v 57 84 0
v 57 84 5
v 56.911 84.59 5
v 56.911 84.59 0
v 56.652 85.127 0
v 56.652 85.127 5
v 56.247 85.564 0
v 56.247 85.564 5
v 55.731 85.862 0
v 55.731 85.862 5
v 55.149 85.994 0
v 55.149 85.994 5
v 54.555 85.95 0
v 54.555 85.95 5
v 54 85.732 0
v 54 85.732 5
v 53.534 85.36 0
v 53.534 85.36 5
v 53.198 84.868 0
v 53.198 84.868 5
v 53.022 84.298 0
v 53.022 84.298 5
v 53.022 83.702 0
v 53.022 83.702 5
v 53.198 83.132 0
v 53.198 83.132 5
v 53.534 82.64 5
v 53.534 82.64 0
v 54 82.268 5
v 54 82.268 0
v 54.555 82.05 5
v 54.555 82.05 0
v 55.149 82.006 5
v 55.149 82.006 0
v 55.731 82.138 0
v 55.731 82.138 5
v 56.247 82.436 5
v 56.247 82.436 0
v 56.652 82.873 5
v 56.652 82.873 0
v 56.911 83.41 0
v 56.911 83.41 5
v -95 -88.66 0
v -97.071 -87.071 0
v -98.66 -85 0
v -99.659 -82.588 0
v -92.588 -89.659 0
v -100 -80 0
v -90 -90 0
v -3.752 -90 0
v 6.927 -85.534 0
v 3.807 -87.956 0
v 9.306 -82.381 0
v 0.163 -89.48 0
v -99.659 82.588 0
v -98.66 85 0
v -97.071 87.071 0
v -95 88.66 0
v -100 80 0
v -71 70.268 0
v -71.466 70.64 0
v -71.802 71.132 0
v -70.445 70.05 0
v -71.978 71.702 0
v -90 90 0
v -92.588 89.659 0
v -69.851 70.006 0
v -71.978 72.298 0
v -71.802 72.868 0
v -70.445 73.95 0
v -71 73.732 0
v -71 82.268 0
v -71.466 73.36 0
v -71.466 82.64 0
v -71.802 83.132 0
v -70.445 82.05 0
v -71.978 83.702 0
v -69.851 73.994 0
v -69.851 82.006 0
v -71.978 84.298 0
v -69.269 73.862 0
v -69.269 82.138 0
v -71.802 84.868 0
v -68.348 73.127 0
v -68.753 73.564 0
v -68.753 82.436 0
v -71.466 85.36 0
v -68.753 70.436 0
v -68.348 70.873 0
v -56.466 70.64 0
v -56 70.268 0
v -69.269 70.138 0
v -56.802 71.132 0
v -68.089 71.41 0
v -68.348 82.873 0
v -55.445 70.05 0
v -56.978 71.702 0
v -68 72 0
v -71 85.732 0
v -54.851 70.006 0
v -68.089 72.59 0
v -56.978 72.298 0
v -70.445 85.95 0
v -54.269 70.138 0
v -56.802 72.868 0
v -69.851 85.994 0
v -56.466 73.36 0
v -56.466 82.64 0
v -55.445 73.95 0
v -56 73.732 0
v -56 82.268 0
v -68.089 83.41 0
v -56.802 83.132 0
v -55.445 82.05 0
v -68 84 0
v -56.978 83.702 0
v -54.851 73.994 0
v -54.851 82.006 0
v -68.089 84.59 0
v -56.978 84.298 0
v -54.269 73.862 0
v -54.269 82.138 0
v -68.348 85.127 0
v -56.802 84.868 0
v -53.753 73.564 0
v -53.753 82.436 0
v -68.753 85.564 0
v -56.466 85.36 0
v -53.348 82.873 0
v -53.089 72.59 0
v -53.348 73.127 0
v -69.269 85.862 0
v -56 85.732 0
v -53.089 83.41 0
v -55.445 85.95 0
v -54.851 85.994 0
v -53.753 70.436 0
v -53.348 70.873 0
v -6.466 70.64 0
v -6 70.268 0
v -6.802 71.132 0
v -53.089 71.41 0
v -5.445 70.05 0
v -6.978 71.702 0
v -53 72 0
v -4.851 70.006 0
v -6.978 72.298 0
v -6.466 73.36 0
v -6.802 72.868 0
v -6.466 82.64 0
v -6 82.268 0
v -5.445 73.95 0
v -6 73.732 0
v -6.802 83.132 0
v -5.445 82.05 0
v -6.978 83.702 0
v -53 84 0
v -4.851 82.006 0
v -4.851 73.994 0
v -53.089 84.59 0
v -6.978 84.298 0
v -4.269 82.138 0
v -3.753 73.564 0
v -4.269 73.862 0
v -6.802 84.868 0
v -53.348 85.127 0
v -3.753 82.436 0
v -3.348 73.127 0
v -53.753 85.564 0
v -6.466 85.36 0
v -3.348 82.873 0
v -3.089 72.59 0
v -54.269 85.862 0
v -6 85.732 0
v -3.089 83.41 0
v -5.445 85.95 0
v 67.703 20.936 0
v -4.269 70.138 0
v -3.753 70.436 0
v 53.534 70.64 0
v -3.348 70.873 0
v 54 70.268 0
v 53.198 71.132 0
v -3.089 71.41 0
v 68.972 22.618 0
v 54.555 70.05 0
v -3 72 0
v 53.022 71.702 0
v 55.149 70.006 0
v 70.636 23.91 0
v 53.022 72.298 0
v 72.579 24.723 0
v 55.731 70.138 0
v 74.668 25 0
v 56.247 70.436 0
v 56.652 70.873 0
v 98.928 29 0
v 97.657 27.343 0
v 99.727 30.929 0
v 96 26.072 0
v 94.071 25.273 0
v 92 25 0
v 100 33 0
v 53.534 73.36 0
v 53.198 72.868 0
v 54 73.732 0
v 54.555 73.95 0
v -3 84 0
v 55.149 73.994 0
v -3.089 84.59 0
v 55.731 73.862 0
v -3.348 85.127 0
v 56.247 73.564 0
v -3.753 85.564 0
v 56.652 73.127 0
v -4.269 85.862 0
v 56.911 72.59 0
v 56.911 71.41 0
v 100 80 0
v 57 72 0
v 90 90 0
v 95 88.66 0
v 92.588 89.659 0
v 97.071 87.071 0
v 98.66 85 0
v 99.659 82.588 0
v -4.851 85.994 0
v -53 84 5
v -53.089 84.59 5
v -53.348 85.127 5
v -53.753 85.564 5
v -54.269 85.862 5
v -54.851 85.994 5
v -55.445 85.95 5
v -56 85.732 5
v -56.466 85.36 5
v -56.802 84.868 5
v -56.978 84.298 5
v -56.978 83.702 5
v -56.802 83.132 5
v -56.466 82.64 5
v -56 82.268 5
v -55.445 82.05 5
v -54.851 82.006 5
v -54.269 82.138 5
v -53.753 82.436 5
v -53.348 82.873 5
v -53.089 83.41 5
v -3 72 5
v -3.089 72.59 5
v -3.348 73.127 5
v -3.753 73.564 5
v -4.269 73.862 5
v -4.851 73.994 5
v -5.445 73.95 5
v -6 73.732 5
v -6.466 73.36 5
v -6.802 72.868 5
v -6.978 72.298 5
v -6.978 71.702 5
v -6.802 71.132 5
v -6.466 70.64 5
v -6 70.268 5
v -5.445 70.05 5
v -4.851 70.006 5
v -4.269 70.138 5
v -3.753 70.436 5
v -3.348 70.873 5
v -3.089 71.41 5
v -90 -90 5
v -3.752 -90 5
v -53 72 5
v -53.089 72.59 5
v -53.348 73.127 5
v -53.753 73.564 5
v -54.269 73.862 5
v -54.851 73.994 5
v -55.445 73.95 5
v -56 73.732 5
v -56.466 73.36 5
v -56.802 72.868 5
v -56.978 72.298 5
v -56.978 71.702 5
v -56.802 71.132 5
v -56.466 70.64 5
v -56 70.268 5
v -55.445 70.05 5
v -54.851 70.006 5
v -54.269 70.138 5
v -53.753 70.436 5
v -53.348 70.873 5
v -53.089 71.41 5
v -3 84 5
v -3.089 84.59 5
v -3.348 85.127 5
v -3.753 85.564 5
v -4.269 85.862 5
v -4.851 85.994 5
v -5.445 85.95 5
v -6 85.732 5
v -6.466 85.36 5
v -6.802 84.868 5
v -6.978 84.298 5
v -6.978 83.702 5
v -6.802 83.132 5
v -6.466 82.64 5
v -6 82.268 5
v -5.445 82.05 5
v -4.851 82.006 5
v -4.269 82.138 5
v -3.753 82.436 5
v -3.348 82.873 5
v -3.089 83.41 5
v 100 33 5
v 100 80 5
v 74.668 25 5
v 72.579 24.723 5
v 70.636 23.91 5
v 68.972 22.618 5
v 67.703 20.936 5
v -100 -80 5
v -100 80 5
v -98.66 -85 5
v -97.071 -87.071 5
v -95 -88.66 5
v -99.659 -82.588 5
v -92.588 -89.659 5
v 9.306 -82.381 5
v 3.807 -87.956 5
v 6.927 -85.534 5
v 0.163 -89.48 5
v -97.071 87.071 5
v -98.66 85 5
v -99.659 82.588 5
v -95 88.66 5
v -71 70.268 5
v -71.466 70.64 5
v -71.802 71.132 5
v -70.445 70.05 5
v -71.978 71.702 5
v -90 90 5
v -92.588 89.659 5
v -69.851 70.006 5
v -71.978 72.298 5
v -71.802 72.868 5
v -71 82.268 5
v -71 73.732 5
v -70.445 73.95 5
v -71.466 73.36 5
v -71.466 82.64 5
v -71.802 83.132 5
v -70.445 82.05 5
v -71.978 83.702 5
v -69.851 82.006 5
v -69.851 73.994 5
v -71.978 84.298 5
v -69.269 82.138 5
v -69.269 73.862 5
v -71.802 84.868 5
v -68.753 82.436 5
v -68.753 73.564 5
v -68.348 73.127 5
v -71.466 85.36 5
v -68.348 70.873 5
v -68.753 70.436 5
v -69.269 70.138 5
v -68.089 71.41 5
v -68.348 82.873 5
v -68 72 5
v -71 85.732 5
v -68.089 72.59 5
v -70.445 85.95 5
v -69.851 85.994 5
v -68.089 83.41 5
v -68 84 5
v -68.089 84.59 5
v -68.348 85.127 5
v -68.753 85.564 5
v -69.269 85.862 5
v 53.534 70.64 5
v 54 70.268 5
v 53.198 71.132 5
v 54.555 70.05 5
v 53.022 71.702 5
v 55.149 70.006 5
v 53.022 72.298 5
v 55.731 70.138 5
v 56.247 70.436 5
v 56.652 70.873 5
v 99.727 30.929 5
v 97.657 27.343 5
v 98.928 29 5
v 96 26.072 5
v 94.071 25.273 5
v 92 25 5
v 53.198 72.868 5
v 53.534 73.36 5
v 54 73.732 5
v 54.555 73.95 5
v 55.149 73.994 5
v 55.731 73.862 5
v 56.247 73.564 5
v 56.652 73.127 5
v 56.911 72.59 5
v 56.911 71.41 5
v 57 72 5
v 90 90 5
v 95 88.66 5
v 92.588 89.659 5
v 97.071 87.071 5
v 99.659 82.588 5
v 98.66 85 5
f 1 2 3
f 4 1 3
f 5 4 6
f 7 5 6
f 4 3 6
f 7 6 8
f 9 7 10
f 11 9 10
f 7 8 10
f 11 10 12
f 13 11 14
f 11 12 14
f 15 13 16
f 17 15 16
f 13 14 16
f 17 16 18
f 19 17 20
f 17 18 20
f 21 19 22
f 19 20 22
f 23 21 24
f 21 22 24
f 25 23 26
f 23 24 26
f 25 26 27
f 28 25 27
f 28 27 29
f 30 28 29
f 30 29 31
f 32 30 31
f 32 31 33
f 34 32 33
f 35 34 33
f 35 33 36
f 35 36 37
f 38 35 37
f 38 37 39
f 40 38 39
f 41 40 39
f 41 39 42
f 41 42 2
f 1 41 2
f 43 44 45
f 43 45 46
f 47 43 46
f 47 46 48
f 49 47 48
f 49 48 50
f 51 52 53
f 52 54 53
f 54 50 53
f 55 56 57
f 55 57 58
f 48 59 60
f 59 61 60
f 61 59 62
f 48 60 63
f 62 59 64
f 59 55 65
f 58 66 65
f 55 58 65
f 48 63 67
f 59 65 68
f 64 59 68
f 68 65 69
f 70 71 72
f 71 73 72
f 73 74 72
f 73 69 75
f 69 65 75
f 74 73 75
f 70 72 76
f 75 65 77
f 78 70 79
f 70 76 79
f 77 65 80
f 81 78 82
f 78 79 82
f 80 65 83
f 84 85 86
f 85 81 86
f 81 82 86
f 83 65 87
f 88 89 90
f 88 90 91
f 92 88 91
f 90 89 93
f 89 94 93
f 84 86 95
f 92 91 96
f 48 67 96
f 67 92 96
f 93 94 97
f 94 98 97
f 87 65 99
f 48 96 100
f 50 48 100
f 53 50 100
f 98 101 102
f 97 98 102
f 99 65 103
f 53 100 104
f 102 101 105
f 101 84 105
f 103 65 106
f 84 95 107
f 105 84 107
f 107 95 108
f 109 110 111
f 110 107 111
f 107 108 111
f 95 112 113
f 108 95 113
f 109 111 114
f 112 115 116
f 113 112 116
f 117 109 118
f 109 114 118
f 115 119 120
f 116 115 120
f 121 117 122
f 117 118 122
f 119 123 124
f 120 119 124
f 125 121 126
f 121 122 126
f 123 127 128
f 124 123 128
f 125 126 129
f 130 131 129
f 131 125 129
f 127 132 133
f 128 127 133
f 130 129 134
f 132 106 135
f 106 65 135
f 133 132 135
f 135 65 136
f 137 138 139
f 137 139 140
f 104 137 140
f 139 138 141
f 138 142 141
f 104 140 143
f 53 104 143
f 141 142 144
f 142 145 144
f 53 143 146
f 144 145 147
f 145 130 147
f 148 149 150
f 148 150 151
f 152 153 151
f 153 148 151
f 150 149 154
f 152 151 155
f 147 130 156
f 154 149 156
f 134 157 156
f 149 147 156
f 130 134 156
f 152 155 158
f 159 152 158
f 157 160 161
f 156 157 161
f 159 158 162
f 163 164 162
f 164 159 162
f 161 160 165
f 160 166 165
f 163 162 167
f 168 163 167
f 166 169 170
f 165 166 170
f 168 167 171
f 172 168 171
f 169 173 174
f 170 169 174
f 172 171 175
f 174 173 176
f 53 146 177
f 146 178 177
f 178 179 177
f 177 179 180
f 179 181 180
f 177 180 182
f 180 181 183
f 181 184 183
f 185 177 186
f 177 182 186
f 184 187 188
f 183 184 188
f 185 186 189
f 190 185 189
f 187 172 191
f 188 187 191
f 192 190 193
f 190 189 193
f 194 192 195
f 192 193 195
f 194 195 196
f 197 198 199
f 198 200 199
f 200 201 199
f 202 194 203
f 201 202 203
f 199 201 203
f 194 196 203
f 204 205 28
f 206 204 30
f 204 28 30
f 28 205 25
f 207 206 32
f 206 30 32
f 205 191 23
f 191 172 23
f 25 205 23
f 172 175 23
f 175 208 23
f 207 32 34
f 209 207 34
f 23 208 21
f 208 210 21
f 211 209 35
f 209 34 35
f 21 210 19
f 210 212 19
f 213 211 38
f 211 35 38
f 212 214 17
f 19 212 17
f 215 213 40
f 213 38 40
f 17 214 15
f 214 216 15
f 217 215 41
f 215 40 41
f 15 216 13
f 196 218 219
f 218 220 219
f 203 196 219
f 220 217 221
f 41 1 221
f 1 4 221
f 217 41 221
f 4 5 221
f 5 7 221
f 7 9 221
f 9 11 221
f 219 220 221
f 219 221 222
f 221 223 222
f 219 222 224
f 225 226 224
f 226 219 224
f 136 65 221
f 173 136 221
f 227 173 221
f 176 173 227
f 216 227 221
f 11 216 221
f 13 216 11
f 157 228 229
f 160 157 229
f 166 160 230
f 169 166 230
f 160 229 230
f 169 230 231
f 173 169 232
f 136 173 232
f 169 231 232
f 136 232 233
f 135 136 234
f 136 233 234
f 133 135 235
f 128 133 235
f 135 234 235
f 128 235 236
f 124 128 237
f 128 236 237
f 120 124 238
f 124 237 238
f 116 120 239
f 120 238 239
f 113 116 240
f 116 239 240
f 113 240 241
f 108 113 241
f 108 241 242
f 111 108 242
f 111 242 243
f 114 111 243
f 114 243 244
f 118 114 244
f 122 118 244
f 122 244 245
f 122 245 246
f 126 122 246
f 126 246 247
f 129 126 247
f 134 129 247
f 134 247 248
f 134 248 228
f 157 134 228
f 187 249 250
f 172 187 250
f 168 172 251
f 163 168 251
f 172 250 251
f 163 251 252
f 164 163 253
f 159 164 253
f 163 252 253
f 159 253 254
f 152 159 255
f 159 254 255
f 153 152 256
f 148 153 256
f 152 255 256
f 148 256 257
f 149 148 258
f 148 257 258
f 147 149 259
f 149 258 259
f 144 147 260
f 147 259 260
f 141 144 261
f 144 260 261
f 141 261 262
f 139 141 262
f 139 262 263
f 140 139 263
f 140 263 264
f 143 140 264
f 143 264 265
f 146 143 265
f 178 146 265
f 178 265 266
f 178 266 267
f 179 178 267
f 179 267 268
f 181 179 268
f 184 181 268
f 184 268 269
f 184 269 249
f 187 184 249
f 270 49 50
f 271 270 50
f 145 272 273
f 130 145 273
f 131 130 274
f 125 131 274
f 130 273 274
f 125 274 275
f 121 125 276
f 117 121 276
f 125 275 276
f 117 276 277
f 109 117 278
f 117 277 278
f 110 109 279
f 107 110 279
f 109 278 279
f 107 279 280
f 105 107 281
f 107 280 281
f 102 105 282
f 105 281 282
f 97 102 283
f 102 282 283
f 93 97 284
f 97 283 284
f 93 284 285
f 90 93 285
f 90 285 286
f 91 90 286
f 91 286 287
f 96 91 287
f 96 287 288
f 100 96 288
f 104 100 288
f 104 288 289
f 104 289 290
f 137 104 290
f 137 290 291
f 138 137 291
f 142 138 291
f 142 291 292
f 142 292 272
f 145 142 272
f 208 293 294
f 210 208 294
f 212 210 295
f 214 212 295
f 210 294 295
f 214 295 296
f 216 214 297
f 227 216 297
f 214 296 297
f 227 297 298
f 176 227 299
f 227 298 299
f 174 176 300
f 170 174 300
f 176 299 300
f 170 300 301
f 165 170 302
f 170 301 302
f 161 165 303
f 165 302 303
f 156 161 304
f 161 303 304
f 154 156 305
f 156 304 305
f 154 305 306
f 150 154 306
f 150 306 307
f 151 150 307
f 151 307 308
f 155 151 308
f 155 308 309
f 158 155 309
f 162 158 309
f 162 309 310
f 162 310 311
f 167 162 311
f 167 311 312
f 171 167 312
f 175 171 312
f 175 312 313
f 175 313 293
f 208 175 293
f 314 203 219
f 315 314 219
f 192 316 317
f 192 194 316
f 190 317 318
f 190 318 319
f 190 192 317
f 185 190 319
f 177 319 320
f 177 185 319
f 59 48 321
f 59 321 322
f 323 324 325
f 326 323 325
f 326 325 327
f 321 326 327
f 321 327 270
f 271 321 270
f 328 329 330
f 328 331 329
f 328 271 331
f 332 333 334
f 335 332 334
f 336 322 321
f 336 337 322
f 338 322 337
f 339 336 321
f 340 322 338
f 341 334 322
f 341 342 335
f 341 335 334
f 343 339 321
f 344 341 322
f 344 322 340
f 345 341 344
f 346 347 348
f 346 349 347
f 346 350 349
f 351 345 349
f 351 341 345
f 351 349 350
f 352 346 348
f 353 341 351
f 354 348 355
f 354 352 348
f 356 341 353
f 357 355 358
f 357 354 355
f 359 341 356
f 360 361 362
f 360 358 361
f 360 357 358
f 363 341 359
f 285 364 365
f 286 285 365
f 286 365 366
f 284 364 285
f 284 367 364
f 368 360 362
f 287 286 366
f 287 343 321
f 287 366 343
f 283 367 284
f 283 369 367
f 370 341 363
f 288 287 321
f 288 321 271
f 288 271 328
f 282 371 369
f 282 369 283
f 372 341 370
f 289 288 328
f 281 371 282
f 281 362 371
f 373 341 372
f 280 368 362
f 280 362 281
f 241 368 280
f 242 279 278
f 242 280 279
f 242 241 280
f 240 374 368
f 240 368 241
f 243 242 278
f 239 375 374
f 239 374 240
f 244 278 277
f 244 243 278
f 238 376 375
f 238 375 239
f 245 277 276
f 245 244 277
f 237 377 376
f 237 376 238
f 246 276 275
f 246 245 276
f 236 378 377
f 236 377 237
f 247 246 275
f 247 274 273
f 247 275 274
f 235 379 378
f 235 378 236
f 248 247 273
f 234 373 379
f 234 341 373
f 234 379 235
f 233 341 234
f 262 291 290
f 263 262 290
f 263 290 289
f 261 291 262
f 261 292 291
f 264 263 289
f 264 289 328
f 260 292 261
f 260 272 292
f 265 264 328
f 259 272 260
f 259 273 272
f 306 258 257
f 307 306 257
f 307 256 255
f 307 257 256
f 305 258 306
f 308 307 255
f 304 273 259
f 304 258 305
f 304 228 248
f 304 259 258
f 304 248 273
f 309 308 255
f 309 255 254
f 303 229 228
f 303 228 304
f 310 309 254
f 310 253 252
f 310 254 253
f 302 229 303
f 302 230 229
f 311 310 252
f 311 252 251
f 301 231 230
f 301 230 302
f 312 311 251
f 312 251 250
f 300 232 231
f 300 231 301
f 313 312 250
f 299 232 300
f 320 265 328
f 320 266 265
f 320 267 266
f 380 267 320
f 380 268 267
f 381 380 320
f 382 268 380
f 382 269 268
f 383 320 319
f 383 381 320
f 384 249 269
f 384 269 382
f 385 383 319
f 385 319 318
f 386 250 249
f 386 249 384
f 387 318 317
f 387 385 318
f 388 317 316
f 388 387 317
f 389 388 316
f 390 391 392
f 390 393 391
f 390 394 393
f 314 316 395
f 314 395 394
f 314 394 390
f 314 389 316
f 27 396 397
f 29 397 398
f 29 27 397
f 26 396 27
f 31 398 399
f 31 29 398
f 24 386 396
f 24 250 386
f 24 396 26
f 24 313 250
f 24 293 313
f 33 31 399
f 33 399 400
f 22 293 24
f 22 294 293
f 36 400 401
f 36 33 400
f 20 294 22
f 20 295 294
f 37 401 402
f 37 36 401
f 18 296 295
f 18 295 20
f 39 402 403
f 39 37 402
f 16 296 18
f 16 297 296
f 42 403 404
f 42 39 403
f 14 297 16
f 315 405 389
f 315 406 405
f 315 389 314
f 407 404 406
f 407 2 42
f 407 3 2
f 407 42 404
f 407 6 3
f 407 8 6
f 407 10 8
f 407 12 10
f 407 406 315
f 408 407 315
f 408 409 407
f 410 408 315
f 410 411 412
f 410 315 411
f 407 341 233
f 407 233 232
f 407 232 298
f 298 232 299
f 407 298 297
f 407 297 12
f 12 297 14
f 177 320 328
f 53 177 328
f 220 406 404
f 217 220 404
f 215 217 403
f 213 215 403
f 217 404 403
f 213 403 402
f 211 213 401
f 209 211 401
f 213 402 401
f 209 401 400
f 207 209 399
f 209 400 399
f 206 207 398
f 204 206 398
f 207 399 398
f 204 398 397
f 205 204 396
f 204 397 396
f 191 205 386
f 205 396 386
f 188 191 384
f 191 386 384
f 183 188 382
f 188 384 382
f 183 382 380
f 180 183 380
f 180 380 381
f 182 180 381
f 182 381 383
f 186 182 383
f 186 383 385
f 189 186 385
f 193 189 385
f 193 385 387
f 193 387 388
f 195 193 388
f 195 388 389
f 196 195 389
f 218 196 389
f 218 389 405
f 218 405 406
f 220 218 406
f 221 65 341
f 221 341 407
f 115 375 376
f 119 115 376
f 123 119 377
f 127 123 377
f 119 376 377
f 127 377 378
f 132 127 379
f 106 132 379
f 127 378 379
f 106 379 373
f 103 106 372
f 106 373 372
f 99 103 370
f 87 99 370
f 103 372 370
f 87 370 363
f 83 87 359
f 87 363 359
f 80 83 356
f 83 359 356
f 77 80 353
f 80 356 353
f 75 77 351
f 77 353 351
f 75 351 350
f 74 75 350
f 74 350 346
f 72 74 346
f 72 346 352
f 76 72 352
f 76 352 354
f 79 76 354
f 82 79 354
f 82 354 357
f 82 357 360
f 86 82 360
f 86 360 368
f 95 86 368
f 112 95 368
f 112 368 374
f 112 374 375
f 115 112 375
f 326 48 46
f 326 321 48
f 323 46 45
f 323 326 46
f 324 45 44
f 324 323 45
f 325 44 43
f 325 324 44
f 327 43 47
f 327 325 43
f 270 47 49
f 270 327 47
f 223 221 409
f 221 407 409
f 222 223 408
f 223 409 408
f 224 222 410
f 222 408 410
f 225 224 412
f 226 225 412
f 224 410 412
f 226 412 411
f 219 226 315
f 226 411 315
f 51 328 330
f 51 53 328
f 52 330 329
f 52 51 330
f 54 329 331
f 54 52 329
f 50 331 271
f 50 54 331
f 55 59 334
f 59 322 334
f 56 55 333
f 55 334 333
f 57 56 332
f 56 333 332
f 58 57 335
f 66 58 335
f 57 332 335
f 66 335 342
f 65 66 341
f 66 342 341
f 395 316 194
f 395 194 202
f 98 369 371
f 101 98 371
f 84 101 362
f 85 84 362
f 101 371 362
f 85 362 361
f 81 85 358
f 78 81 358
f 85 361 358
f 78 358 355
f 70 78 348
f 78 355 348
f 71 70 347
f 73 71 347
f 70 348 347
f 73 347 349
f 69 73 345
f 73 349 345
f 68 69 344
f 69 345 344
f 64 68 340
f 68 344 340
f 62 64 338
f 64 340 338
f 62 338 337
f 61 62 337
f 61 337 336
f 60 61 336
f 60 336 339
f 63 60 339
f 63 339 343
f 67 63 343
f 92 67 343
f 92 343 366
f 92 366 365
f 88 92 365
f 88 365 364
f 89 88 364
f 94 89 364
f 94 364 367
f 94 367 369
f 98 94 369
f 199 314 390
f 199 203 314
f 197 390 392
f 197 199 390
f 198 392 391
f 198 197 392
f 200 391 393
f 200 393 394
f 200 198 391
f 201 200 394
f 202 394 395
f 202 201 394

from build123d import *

# Parameters (mm, degrees)
SKETCH_1_W          = 200
SKETCH_1_H          = 180
EXTRUDE_1_DEPTH     = 5
SKETCH_2_R          = 2
CUT_EXTRUDE_1_DEPTH = 135.629120178
FILLET_1_R          = 10
SKETCH_3_W          = 30
SKETCH_3_H          = 115
CUT_EXTRUDE_2_DEPTH = 135.629120178
CUT_EXTRUDE_3_DEPTH = 135.629120178
FILLET_2_R          = 8
FILLET_3_R          = 15


with BuildPart() as part:
    # Sketch 1 → Extrude 1 (new body)
    with BuildSketch(Plane.XY):
        Rectangle(SKETCH_1_W, SKETCH_1_H)
    extrude(amount=EXTRUDE_1_DEPTH)

    # Sketch 2 → Cut-Extrude 1 (cut, through all)
    with BuildSketch(Plane.XY.offset(5)):
        with Locations((-70, 84)):
            Circle(SKETCH_2_R)
        with Locations((-70, 72)):
            Circle(SKETCH_2_R)
        with Locations((-55, 84)):
            Circle(SKETCH_2_R)
        with Locations((-55, 72)):
            Circle(SKETCH_2_R)
        with Locations((-5, 84)):
            Circle(SKETCH_2_R)
        with Locations((-5, 72)):
            Circle(SKETCH_2_R)
        with Locations((55, 84)):
            Circle(SKETCH_2_R)
        with Locations((55, 72)):
            Circle(SKETCH_2_R)
    extrude(amount=-CUT_EXTRUDE_1_DEPTH, mode=Mode.SUBTRACT)

    # Fillet 1
    fillet_1_edges = [part.edges().sort_by_distance(p)[0] for p in [
        (-100, 90, 2.5),
        (100, 90, 2.5),
        (100, -90, 2.5),
        (-100, -90, 2.5),
    ]]
    fillet(fillet_1_edges, radius=FILLET_1_R)

    # Sketch 3 → Cut-Extrude 2 (cut, through all)
    with BuildSketch(Plane.XY.offset(5)):
        with Locations((85, -32.5)):
            Rectangle(SKETCH_3_W, SKETCH_3_H)
    extrude(amount=-CUT_EXTRUDE_2_DEPTH, mode=Mode.SUBTRACT)

    # Sketch 4 → Cut-Extrude 3 (cut, through all)
    with BuildSketch(Plane.XY.offset(5)):
        Polygon((70, 25), (5, -90), (70, -90), align=None)
    extrude(amount=-CUT_EXTRUDE_3_DEPTH, mode=Mode.SUBTRACT)

    # Fillet 2
    fillet_2_edges = [part.edges().sort_by_distance(p)[0] for p in [
        (100, 25, 2.5),
        (70, 25, 2.5),
    ]]
    fillet(fillet_2_edges, radius=FILLET_2_R)

    # Fillet 3
    fillet_3_edges = [part.edges().sort_by_distance(p)[0] for p in [
        (5, -90, 2.5),
    ]]
    fillet(fillet_3_edges, radius=FILLET_3_R)


solid = part.part
